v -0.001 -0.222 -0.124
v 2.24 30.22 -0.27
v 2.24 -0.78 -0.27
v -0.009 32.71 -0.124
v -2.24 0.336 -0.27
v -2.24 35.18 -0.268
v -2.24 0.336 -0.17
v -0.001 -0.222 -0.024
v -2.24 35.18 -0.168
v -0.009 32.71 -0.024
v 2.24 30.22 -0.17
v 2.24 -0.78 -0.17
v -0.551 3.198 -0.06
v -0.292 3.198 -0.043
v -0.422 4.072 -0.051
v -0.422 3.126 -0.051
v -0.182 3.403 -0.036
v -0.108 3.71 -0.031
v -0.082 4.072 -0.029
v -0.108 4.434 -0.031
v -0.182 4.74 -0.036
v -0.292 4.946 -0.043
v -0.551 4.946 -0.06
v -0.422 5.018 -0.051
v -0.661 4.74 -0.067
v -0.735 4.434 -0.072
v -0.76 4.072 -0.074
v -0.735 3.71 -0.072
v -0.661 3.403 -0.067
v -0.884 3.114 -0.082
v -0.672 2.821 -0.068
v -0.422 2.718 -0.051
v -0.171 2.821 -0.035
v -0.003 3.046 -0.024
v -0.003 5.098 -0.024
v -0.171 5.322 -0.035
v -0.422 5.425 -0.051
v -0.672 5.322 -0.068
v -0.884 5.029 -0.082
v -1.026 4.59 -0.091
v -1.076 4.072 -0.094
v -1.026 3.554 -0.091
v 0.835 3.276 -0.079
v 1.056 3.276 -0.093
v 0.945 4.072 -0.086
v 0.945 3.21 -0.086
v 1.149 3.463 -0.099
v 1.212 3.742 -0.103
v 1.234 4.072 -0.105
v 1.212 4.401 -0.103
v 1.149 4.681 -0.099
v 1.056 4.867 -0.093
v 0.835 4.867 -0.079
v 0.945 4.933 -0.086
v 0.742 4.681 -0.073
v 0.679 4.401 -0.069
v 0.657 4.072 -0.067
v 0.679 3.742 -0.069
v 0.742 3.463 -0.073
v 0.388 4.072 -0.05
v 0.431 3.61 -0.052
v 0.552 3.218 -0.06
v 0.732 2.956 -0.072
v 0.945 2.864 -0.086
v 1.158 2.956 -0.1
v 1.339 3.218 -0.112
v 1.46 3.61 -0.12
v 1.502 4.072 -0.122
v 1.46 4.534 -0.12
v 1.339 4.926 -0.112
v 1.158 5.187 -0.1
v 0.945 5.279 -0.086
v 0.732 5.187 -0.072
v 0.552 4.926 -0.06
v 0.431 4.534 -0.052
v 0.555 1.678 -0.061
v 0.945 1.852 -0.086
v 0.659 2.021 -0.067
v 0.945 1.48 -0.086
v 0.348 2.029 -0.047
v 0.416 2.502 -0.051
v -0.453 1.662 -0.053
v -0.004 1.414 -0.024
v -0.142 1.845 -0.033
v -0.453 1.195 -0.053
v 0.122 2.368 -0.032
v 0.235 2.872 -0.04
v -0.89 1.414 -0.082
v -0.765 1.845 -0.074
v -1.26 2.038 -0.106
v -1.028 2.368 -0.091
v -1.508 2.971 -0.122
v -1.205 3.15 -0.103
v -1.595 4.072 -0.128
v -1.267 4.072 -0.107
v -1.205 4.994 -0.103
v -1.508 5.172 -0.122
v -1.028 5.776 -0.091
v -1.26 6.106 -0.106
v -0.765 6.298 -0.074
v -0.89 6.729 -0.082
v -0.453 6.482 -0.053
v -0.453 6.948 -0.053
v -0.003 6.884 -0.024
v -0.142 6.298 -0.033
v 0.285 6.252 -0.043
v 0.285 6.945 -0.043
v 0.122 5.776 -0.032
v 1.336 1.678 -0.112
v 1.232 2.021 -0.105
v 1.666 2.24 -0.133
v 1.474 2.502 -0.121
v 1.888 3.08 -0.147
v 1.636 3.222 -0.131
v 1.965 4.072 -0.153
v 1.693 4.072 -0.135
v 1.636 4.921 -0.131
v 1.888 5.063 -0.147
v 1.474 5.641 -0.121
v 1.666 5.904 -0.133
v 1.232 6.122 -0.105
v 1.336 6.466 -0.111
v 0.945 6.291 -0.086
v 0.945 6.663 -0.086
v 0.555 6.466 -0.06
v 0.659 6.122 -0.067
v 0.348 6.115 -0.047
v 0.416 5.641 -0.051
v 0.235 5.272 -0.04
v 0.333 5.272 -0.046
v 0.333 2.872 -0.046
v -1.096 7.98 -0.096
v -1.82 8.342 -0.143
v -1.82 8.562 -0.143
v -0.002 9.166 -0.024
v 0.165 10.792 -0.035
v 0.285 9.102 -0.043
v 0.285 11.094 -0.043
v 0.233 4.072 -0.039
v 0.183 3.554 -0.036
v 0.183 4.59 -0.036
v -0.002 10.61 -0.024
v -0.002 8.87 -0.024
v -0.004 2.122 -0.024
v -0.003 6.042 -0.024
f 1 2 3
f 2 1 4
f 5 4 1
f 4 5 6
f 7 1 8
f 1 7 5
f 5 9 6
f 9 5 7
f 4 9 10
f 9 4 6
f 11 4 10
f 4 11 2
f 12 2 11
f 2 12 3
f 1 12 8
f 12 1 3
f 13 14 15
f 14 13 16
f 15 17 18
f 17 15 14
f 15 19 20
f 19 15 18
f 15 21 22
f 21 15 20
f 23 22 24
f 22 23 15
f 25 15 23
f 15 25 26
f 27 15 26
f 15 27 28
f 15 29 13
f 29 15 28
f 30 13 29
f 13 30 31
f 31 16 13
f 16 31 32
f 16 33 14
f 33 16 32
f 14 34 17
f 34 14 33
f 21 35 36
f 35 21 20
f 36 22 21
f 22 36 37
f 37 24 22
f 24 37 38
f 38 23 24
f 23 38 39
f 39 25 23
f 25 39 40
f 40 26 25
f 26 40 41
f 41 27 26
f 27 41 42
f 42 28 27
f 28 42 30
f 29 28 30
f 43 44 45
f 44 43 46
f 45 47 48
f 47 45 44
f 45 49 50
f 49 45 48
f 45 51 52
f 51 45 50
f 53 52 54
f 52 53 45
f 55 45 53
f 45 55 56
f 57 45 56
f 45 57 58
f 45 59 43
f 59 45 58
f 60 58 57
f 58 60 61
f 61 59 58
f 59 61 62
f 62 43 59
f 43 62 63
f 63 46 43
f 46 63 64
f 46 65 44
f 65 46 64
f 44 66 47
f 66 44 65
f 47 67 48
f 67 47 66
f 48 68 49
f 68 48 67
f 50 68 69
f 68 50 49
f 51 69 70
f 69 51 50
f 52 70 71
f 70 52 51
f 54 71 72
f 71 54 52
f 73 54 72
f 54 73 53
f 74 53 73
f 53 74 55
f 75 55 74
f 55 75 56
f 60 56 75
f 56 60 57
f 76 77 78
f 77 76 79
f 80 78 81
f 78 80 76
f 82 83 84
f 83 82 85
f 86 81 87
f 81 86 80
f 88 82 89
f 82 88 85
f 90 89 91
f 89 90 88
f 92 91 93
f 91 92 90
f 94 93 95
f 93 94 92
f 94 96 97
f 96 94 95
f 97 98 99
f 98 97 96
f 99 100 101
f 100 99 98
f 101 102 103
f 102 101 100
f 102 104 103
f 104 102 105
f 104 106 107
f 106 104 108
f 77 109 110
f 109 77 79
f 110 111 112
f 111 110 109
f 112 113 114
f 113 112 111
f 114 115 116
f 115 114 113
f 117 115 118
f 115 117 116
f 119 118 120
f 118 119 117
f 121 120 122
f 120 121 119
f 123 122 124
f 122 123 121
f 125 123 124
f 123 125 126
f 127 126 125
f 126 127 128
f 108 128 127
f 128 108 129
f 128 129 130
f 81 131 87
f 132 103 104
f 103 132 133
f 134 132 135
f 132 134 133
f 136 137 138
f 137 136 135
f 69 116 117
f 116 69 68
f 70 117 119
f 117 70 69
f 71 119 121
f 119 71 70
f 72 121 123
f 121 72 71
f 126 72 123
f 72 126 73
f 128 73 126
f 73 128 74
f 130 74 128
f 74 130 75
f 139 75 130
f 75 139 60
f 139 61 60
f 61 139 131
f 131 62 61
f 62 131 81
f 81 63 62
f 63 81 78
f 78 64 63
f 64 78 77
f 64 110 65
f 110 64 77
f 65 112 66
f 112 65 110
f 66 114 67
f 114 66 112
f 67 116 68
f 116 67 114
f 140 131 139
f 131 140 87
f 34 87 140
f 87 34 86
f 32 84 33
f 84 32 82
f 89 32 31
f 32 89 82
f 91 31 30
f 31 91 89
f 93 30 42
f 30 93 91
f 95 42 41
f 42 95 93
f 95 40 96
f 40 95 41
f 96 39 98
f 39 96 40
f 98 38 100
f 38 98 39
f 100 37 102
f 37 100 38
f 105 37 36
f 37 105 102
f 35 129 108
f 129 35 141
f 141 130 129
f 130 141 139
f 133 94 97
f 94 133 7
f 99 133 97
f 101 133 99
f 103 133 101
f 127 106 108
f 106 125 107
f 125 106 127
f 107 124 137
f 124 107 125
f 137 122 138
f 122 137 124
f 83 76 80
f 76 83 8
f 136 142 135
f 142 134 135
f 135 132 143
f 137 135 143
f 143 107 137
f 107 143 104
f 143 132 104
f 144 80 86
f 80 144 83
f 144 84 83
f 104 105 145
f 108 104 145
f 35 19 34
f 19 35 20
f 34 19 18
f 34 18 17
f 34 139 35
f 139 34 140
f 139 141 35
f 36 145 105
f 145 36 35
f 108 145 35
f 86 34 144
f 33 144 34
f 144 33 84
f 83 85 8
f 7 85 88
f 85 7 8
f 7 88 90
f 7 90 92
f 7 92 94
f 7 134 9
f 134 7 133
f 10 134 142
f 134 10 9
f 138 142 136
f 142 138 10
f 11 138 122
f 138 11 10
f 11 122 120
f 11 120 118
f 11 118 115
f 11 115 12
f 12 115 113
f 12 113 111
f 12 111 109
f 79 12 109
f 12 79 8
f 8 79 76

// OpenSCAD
use <../lib.scad>
function ldraw_lib__4125165gc01() = [
// 0 Sticker  0.6 x  4.5 Trapezoid with White "v8" on Right Side on Red Background (Formed)
// 0 Name: 4125165gc01.dat
// 0 Author: Philippe Hurbain [Philo]
// 0 !LDRAW_ORG Part UPDATE 2019-03
// 0 !LICENSE Licensed under CC BY 4.0 : see CAreadme.txt
// 
// 0 BFC CERTIFY CCW
  [0,"BFC","CERTIFY"],
  [0,"BFC","CCW"],
// 
// 0 !KEYWORDS Set 8448
// 
// 0 !HISTORY 2019-12-27 [PTadmin] Official Update 2019-03
// 
// 
// 4 16 -0.0228 0.3101 81.7753 5.6 0.6755 75.55 5.6 0.6762 -1.95 -0.0023 0.31 -0.5544
  [4,16,-0.0228,0.3101,81.7753,5.6,0.6755,75.55,5.6,0.6762,-1.95,-0.0023,0.31,-0.5544],
// 4 16 -0.0228 0.3101 81.7753 -0.0023 0.31 -0.5544 -5.6 0.6762 0.84 -5.6 0.6712 87.95
  [4,16,-0.0228,0.3101,81.7753,-0.0023,0.31,-0.5544,-5.6,0.6762,0.84,-5.6,0.6712,87.95],
// 
// 4 16 -5.6 0.4262 0.84 -5.6 0.6762 0.84 -0.0023 0.31 -0.5544 -0.0024 0.06 -0.5544
  [4,16,-5.6,0.4262,0.84,-5.6,0.6762,0.84,-0.0023,0.31,-0.5544,-0.0024,0.06,-0.5544],
// 4 16 -5.6 0.4212 87.95 -5.6 0.6712 87.95 -5.6 0.6762 0.84 -5.6 0.4262 0.84
  [4,16,-5.6,0.4212,87.95,-5.6,0.6712,87.95,-5.6,0.6762,0.84,-5.6,0.4262,0.84],
// 4 16 -0.0228 0.0601 81.7753 -0.0228 0.3101 81.7753 -5.6 0.6712 87.95 -5.6 0.4212 87.95
  [4,16,-0.0228,0.0601,81.7753,-0.0228,0.3101,81.7753,-5.6,0.6712,87.95,-5.6,0.4212,87.95],
// 4 16 5.6 0.4255 75.55 5.6 0.6755 75.55 -0.0228 0.3101 81.7753 -0.0228 0.0601 81.7753
  [4,16,5.6,0.4255,75.55,5.6,0.6755,75.55,-0.0228,0.3101,81.7753,-0.0228,0.0601,81.7753],
// 4 16 5.6 0.4262 -1.95 5.6 0.6762 -1.95 5.6 0.6755 75.55 5.6 0.4255 75.55
  [4,16,5.6,0.4262,-1.95,5.6,0.6762,-1.95,5.6,0.6755,75.55,5.6,0.4255,75.55],
// 4 16 -0.0024 0.06 -0.5544 -0.0023 0.31 -0.5544 5.6 0.6762 -1.95 5.6 0.4262 -1.95
  [4,16,-0.0024,0.06,-0.5544,-0.0023,0.31,-0.5544,5.6,0.6762,-1.95,5.6,0.4262,-1.95],
// 
// 4 4 -1.054 0.1285 10.1792 -1.378 0.1496 7.9952 -1.054 0.1284 7.8152 -0.729 0.1072 7.9952
  [4,4,-1.054,0.1285,10.1792,-1.378,0.1496,7.9952,-1.054,0.1284,7.8152,-0.729,0.1072,7.9952],
// 4 4 -1.054 0.1285 10.1792 -0.729 0.1072 7.9952 -0.454 0.0892 8.5072 -0.271 0.0772 9.2742
  [4,4,-1.054,0.1285,10.1792,-0.729,0.1072,7.9952,-0.454,0.0892,8.5072,-0.271,0.0772,9.2742],
// 4 4 -1.054 0.1285 10.1792 -0.271 0.0772 9.2742 -0.206 0.073 10.1792 -0.271 0.0773 11.0842
  [4,4,-1.054,0.1285,10.1792,-0.271,0.0772,9.2742,-0.206,0.073,10.1792,-0.271,0.0773,11.0842],
// 4 4 -1.054 0.1285 10.1792 -0.271 0.0773 11.0842 -0.454 0.0892 11.8512 -0.729 0.1072 12.3642
  [4,4,-1.054,0.1285,10.1792,-0.271,0.0773,11.0842,-0.454,0.0892,11.8512,-0.729,0.1072,12.3642],
// 4 4 -1.054 0.1285 10.1792 -0.729 0.1072 12.3642 -1.054 0.1285 12.5442 -1.378 0.1497 12.3642
  [4,4,-1.054,0.1285,10.1792,-0.729,0.1072,12.3642,-1.054,0.1285,12.5442,-1.378,0.1497,12.3642],
// 4 4 -1.054 0.1285 10.1792 -1.378 0.1497 12.3642 -1.653 0.1677 11.8512 -1.837 0.1797 11.0842
  [4,4,-1.054,0.1285,10.1792,-1.378,0.1497,12.3642,-1.653,0.1677,11.8512,-1.837,0.1797,11.0842],
// 4 4 -1.054 0.1285 10.1792 -1.837 0.1797 11.0842 -1.901 0.1839 10.1792 -1.837 0.1797 9.2742
  [4,4,-1.054,0.1285,10.1792,-1.837,0.1797,11.0842,-1.901,0.1839,10.1792,-1.837,0.1797,9.2742],
// 4 4 -1.054 0.1285 10.1792 -1.837 0.1797 9.2742 -1.653 0.1676 8.5072 -1.378 0.1496 7.9952
  [4,4,-1.054,0.1285,10.1792,-1.837,0.1797,9.2742,-1.653,0.1676,8.5072,-1.378,0.1496,7.9952],
// 4 15 -1.653 0.1676 8.5072 -2.21 0.2041 7.7862 -1.68 0.1694 7.0532 -1.378 0.1496 7.9952
  [4,15,-1.653,0.1676,8.5072,-2.21,0.2041,7.7862,-1.68,0.1694,7.0532,-1.378,0.1496,7.9952],
// 4 15 -1.378 0.1496 7.9952 -1.68 0.1694 7.0532 -1.054 0.1284 6.7952 -1.054 0.1284 7.8152
  [4,15,-1.378,0.1496,7.9952,-1.68,0.1694,7.0532,-1.054,0.1284,6.7952,-1.054,0.1284,7.8152],
// 4 15 -1.054 0.1284 7.8152 -1.054 0.1284 6.7952 -0.428 0.0875 7.0532 -0.729 0.1072 7.9952
  [4,15,-1.054,0.1284,7.8152,-1.054,0.1284,6.7952,-0.428,0.0875,7.0532,-0.729,0.1072,7.9952],
// 4 15 -0.729 0.1072 7.9952 -0.428 0.0875 7.0532 -0.0086 0.06 7.6152 -0.454 0.0892 8.5072
  [4,15,-0.729,0.1072,7.9952,-0.428,0.0875,7.0532,-0.0086,0.06,7.6152,-0.454,0.0892,8.5072],
// 4 15 -0.454 0.0892 11.8512 -0.271 0.0773 11.0842 -0.0074 0.06 12.7452 -0.428 0.0876 13.3062
  [4,15,-0.454,0.0892,11.8512,-0.271,0.0773,11.0842,-0.0074,0.06,12.7452,-0.428,0.0876,13.3062],
// 4 15 -0.729 0.1072 12.3642 -0.454 0.0892 11.8512 -0.428 0.0876 13.3062 -1.054 0.1285 13.5632
  [4,15,-0.729,0.1072,12.3642,-0.454,0.0892,11.8512,-0.428,0.0876,13.3062,-1.054,0.1285,13.5632],
// 4 15 -1.054 0.1285 12.5442 -0.729 0.1072 12.3642 -1.054 0.1285 13.5632 -1.68 0.1695 13.3062
  [4,15,-1.054,0.1285,12.5442,-0.729,0.1072,12.3642,-1.054,0.1285,13.5632,-1.68,0.1695,13.3062],
// 4 15 -1.378 0.1497 12.3642 -1.054 0.1285 12.5442 -1.68 0.1695 13.3062 -2.21 0.2041 12.5722
  [4,15,-1.378,0.1497,12.3642,-1.054,0.1285,12.5442,-1.68,0.1695,13.3062,-2.21,0.2041,12.5722],
// 4 15 -1.653 0.1677 11.8512 -1.378 0.1497 12.3642 -2.21 0.2041 12.5722 -2.565 0.2273 11.4742
  [4,15,-1.653,0.1677,11.8512,-1.378,0.1497,12.3642,-2.21,0.2041,12.5722,-2.565,0.2273,11.4742],
// 4 15 -1.837 0.1797 11.0842 -1.653 0.1677 11.8512 -2.565 0.2273 11.4742 -2.689 0.2354 10.1792
  [4,15,-1.837,0.1797,11.0842,-1.653,0.1677,11.8512,-2.565,0.2273,11.4742,-2.689,0.2354,10.1792],
// 4 15 -1.901 0.1839 10.1792 -1.837 0.1797 11.0842 -2.689 0.2354 10.1792 -2.565 0.2273 8.8842
  [4,15,-1.901,0.1839,10.1792,-1.837,0.1797,11.0842,-2.689,0.2354,10.1792,-2.565,0.2273,8.8842],
// 4 15 -1.837 0.1797 9.2742 -1.901 0.1839 10.1792 -2.565 0.2273 8.8842 -2.21 0.2041 7.7862
  [4,15,-1.837,0.1797,9.2742,-1.901,0.1839,10.1792,-2.565,0.2273,8.8842,-2.21,0.2041,7.7862],
// 3 15 -1.653 0.1676 8.5072 -1.837 0.1797 9.2742 -2.21 0.2041 7.7862
  [3,15,-1.653,0.1676,8.5072,-1.837,0.1797,9.2742,-2.21,0.2041,7.7862],
// 4 4 2.363 0.215 10.1792 2.087 0.197 8.1902 2.363 0.2151 8.0262 2.639 0.2331 8.1902
  [4,4,2.363,0.215,10.1792,2.087,0.197,8.1902,2.363,0.2151,8.0262,2.639,0.2331,8.1902],
// 4 4 2.363 0.215 10.1792 2.639 0.2331 8.1902 2.873 0.2484 8.6572 3.029 0.2586 9.3552
  [4,4,2.363,0.215,10.1792,2.639,0.2331,8.1902,2.873,0.2484,8.6572,3.029,0.2586,9.3552],
// 4 4 2.363 0.215 10.1792 3.029 0.2586 9.3552 3.084 0.2621 10.1792 3.029 0.2585 11.0032
  [4,4,2.363,0.215,10.1792,3.029,0.2586,9.3552,3.084,0.2621,10.1792,3.029,0.2585,11.0032],
// 4 4 2.363 0.215 10.1792 3.029 0.2585 11.0032 2.873 0.2483 11.7022 2.639 0.233 12.1682
  [4,4,2.363,0.215,10.1792,3.029,0.2585,11.0032,2.873,0.2483,11.7022,2.639,0.233,12.1682],
// 4 4 2.363 0.215 10.1792 2.639 0.233 12.1682 2.363 0.215 12.3322 2.087 0.1969 12.1682
  [4,4,2.363,0.215,10.1792,2.639,0.233,12.1682,2.363,0.215,12.3322,2.087,0.1969,12.1682],
// 4 4 2.363 0.215 10.1792 2.087 0.1969 12.1682 1.854 0.1817 11.7022 1.697 0.1715 11.0032
  [4,4,2.363,0.215,10.1792,2.087,0.1969,12.1682,1.854,0.1817,11.7022,1.697,0.1715,11.0032],
// 4 4 2.363 0.215 10.1792 1.697 0.1715 11.0032 1.643 0.168 10.1792 1.697 0.1715 9.3552
  [4,4,2.363,0.215,10.1792,1.697,0.1715,11.0032,1.643,0.168,10.1792,1.697,0.1715,9.3552],
// 4 4 2.363 0.215 10.1792 1.697 0.1715 9.3552 1.854 0.1818 8.6572 2.087 0.197 8.1902
  [4,4,2.363,0.215,10.1792,1.697,0.1715,9.3552,1.854,0.1818,8.6572,2.087,0.197,8.1902],
// 4 15 1.697 0.1715 9.3552 1.643 0.168 10.1792 0.971 0.124 10.1792 1.077 0.131 9.0242
  [4,15,1.697,0.1715,9.3552,1.643,0.168,10.1792,0.971,0.124,10.1792,1.077,0.131,9.0242],
// 4 15 1.854 0.1818 8.6572 1.697 0.1715 9.3552 1.077 0.131 9.0242 1.379 0.1507 8.0452
  [4,15,1.854,0.1818,8.6572,1.697,0.1715,9.3552,1.077,0.131,9.0242,1.379,0.1507,8.0452],
// 4 15 2.087 0.197 8.1902 1.854 0.1818 8.6572 1.379 0.1507 8.0452 1.83 0.1802 7.3912
  [4,15,2.087,0.197,8.1902,1.854,0.1818,8.6572,1.379,0.1507,8.0452,1.83,0.1802,7.3912],
// 4 15 2.363 0.2151 8.0262 2.087 0.197 8.1902 1.83 0.1802 7.3912 2.363 0.2151 7.1612
  [4,15,2.363,0.2151,8.0262,2.087,0.197,8.1902,1.83,0.1802,7.3912,2.363,0.2151,7.1612],
// 4 15 2.639 0.2331 8.1902 2.363 0.2151 8.0262 2.363 0.2151 7.1612 2.896 0.2499 7.3912
  [4,15,2.639,0.2331,8.1902,2.363,0.2151,8.0262,2.363,0.2151,7.1612,2.896,0.2499,7.3912],
// 4 15 2.873 0.2484 8.6572 2.639 0.2331 8.1902 2.896 0.2499 7.3912 3.348 0.2794 8.0452
  [4,15,2.873,0.2484,8.6572,2.639,0.2331,8.1902,2.896,0.2499,7.3912,3.348,0.2794,8.0452],
// 4 15 3.029 0.2586 9.3552 2.873 0.2484 8.6572 3.348 0.2794 8.0452 3.65 0.2992 9.0242
  [4,15,3.029,0.2586,9.3552,2.873,0.2484,8.6572,3.348,0.2794,8.0452,3.65,0.2992,9.0242],
// 4 15 3.084 0.2621 10.1792 3.029 0.2586 9.3552 3.65 0.2992 9.0242 3.756 0.3061 10.1792
  [4,15,3.084,0.2621,10.1792,3.029,0.2586,9.3552,3.65,0.2992,9.0242,3.756,0.3061,10.1792],
// 4 15 3.029 0.2585 11.0032 3.084 0.2621 10.1792 3.756 0.3061 10.1792 3.65 0.2991 11.3342
  [4,15,3.029,0.2585,11.0032,3.084,0.2621,10.1792,3.756,0.3061,10.1792,3.65,0.2991,11.3342],
// 4 15 2.873 0.2483 11.7022 3.029 0.2585 11.0032 3.65 0.2991 11.3342 3.348 0.2794 12.3142
  [4,15,2.873,0.2483,11.7022,3.029,0.2585,11.0032,3.65,0.2991,11.3342,3.348,0.2794,12.3142],
// 4 15 2.639 0.233 12.1682 2.873 0.2483 11.7022 3.348 0.2794 12.3142 2.896 0.2498 12.9682
  [4,15,2.639,0.233,12.1682,2.873,0.2483,11.7022,3.348,0.2794,12.3142,2.896,0.2498,12.9682],
// 4 15 2.363 0.215 12.3322 2.639 0.233 12.1682 2.896 0.2498 12.9682 2.363 0.215 13.1982
  [4,15,2.363,0.215,12.3322,2.639,0.233,12.1682,2.896,0.2498,12.9682,2.363,0.215,13.1982],
// 4 15 2.087 0.1969 12.1682 2.363 0.215 12.3322 2.363 0.215 13.1982 1.83 0.1801 12.9682
  [4,15,2.087,0.1969,12.1682,2.363,0.215,12.3322,2.363,0.215,13.1982,1.83,0.1801,12.9682],
// 4 15 1.854 0.1817 11.7022 2.087 0.1969 12.1682 1.83 0.1801 12.9682 1.379 0.1507 12.3142
  [4,15,1.854,0.1817,11.7022,2.087,0.1969,12.1682,1.83,0.1801,12.9682,1.379,0.1507,12.3142],
// 4 15 1.697 0.1715 11.0032 1.854 0.1817 11.7022 1.379 0.1507 12.3142 1.077 0.1309 11.3342
  [4,15,1.697,0.1715,11.0032,1.854,0.1817,11.7022,1.379,0.1507,12.3142,1.077,0.1309,11.3342],
// 4 15 1.643 0.168 10.1792 1.697 0.1715 11.0032 1.077 0.1309 11.3342 0.971 0.124 10.1792
  [4,15,1.643,0.168,10.1792,1.697,0.1715,11.0032,1.077,0.1309,11.3342,0.971,0.124,10.1792],
// 4 15 1.387 0.1513 4.1952 2.363 0.2151 3.7012 2.363 0.2151 4.6312 1.648 0.1684 5.0532
  [4,15,1.387,0.1513,4.1952,2.363,0.2151,3.7012,2.363,0.2151,4.6312,1.648,0.1684,5.0532],
// 4 15 0.871 0.1176 5.0722 1.387 0.1513 4.1952 1.648 0.1684 5.0532 1.041 0.1287 6.2562
  [4,15,0.871,0.1176,5.0722,1.387,0.1513,4.1952,1.648,0.1684,5.0532,1.041,0.1287,6.2562],
// 4 15 -1.133 0.1335 4.1542 -1.133 0.1335 2.9882 -0.0097 0.06 3.5352 -0.355 0.0827 4.6132
  [4,15,-1.133,0.1335,4.1542,-1.133,0.1335,2.9882,-0.0097,0.06,3.5352,-0.355,0.0827,4.6132],
// 4 15 0.304 0.0805 5.9192 0.871 0.1176 5.0722 1.041 0.1287 6.2562 0.588 0.099 7.1802
  [4,15,0.304,0.0805,5.9192,0.871,0.1176,5.0722,1.041,0.1287,6.2562,0.588,0.099,7.1802],
// 4 15 -2.225 0.205 3.5352 -1.133 0.1335 2.9882 -1.133 0.1335 4.1542 -1.912 0.1845 4.6132
  [4,15,-2.225,0.205,3.5352,-1.133,0.1335,2.9882,-1.133,0.1335,4.1542,-1.912,0.1845,4.6132],
// 4 15 -3.151 0.2656 5.0942 -2.225 0.205 3.5352 -1.912 0.1845 4.6132 -2.571 0.2276 5.9192
  [4,15,-3.151,0.2656,5.0942,-2.225,0.205,3.5352,-1.912,0.1845,4.6132,-2.571,0.2276,5.9192],
// 4 15 -3.77 0.3061 7.4272 -3.151 0.2656 5.0942 -2.571 0.2276 5.9192 -3.012 0.2565 7.8742
  [4,15,-3.77,0.3061,7.4272,-3.151,0.2656,5.0942,-2.571,0.2276,5.9192,-3.012,0.2565,7.8742],
// 4 15 -3.987 0.3203 10.1792 -3.77 0.3061 7.4272 -3.012 0.2565 7.8742 -3.167 0.2667 10.1792
  [4,15,-3.987,0.3203,10.1792,-3.77,0.3061,7.4272,-3.012,0.2565,7.8742,-3.167,0.2667,10.1792],
// 4 15 -3.77 0.3062 12.9312 -3.987 0.3203 10.1792 -3.167 0.2667 10.1792 -3.012 0.2566 12.4852
  [4,15,-3.77,0.3062,12.9312,-3.987,0.3203,10.1792,-3.167,0.2667,10.1792,-3.012,0.2566,12.4852],
// 4 15 -3.151 0.2657 15.2642 -3.77 0.3062 12.9312 -3.012 0.2566 12.4852 -2.571 0.2278 14.4402
  [4,15,-3.151,0.2657,15.2642,-3.77,0.3062,12.9312,-3.012,0.2566,12.4852,-2.571,0.2278,14.4402],
// 4 15 -2.225 0.2052 16.8232 -3.151 0.2657 15.2642 -2.571 0.2278 14.4402 -1.912 0.1847 15.7462
  [4,15,-2.225,0.2052,16.8232,-3.151,0.2657,15.2642,-2.571,0.2278,14.4402,-1.912,0.1847,15.7462],
// 4 15 -1.133 0.1337 17.3712 -2.225 0.2052 16.8232 -1.912 0.1847 15.7462 -1.133 0.1337 16.2042
  [4,15,-1.133,0.1337,17.3712,-2.225,0.2052,16.8232,-1.912,0.1847,15.7462,-1.133,0.1337,16.2042],
// 4 15 -0.0063 0.06 17.2112 -1.133 0.1337 17.3712 -1.133 0.1337 16.2042 -0.355 0.0828 15.7462
  [4,15,-0.0063,0.06,17.2112,-1.133,0.1337,17.3712,-1.133,0.1337,16.2042,-0.355,0.0828,15.7462],
// 4 15 -0.0063 0.06 17.2112 0.304 0.0804 14.4402 0.712 0.107 15.6292 0.712 0.107 17.3632
  [4,15,-0.0063,0.06,17.2112,0.304,0.0804,14.4402,0.712,0.107,15.6292,0.712,0.107,17.3632],
// 4 15 2.363 0.2151 4.6312 2.363 0.2151 3.7012 3.339 0.2789 4.1952 3.079 0.2619 5.0532
  [4,15,2.363,0.2151,4.6312,2.363,0.2151,3.7012,3.339,0.2789,4.1952,3.079,0.2619,5.0532],
// 4 15 3.079 0.2619 5.0532 3.339 0.2789 4.1952 4.166 0.3328 5.5992 3.685 0.3015 6.2562
  [4,15,3.079,0.2619,5.0532,3.339,0.2789,4.1952,4.166,0.3328,5.5992,3.685,0.3015,6.2562],
// 4 15 3.685 0.3015 6.2562 4.166 0.3328 5.5992 4.719 0.3687 7.7002 4.091 0.3279 8.0562
  [4,15,3.685,0.3015,6.2562,4.166,0.3328,5.5992,4.719,0.3687,7.7002,4.091,0.3279,8.0562],
// 4 15 4.091 0.3279 8.0562 4.719 0.3687 7.7002 4.913 0.3813 10.1792 4.233 0.3371 10.1792
  [4,15,4.091,0.3279,8.0562,4.719,0.3687,7.7002,4.913,0.3813,10.1792,4.233,0.3371,10.1792],
// 4 15 4.233 0.3371 10.1792 4.913 0.3813 10.1792 4.719 0.3687 12.6582 4.091 0.3279 12.3032
  [4,15,4.233,0.3371,10.1792,4.913,0.3813,10.1792,4.719,0.3687,12.6582,4.091,0.3279,12.3032],
// 4 15 4.091 0.3279 12.3032 4.719 0.3687 12.6582 4.166 0.3328 14.7602 3.685 0.3014 14.1032
  [4,15,4.091,0.3279,12.3032,4.719,0.3687,12.6582,4.166,0.3328,14.7602,3.685,0.3014,14.1032],
// 4 15 3.685 0.3014 14.1032 4.166 0.3328 14.7602 3.339 0.2787 16.1642 3.079 0.2617 15.3052
  [4,15,3.685,0.3014,14.1032,4.166,0.3328,14.7602,3.339,0.2787,16.1642,3.079,0.2617,15.3052],
// 4 15 3.079 0.2617 15.3052 3.339 0.2787 16.1642 2.363 0.2149 16.6572 2.363 0.2149 15.7282
  [4,15,3.079,0.2617,15.3052,3.339,0.2787,16.1642,2.363,0.2149,16.6572,2.363,0.2149,15.7282],
// 4 15 2.363 0.2149 15.7282 2.363 0.2149 16.6572 1.387 0.1511 16.1642 1.648 0.1682 15.3052
  [4,15,2.363,0.2149,15.7282,2.363,0.2149,16.6572,1.387,0.1511,16.1642,1.648,0.1682,15.3052],
// 4 15 1.648 0.1682 15.3052 1.387 0.1511 16.1642 0.871 0.1174 15.2872 1.041 0.1285 14.1032
  [4,15,1.648,0.1682,15.3052,1.387,0.1511,16.1642,0.871,0.1174,15.2872,1.041,0.1285,14.1032],
// 4 15 1.041 0.1285 14.1032 0.871 0.1174 15.2872 0.304 0.0804 14.4402 0.588 0.0989 13.1792
  [4,15,1.041,0.1285,14.1032,0.871,0.1174,15.2872,0.304,0.0804,14.4402,0.588,0.0989,13.1792],
// 3 15 1.041 0.1285 14.1032 0.588 0.0989 13.1792 0.833 0.115 13.1792
  [3,15,1.041,0.1285,14.1032,0.588,0.0989,13.1792,0.833,0.115,13.1792],
// 3 15 1.041 0.1287 6.2562 0.833 0.1151 7.1802 0.588 0.099 7.1802
  [3,15,1.041,0.1287,6.2562,0.833,0.1151,7.1802,0.588,0.099,7.1802],
// 4 15 -1.133 0.1337 17.3712 -0.0063 0.06 17.2112 -2.739 0.2388 19.9502 -4.55 0.3573 20.8562
  [4,15,-1.133,0.1337,17.3712,-0.0063,0.06,17.2112,-2.739,0.2388,19.9502,-4.55,0.3573,20.8562],
// 4 15 -4.55 0.3573 21.4062 -4.55 0.3573 20.8562 -2.739 0.2388 19.9502 -0.0048 0.06 22.9142
  [4,15,-4.55,0.3573,21.4062,-4.55,0.3573,20.8562,-2.739,0.2388,19.9502,-0.0048,0.06,22.9142],
// 4 15 0.712 0.1068 27.7352 0.413 0.0873 26.9812 -0.0048 0.06 22.9142 0.712 0.1069 22.7542
  [4,15,0.712,0.1068,27.7352,0.413,0.0873,26.9812,-0.0048,0.06,22.9142,0.712,0.1069,22.7542],
// 4 4 3.65 0.2991 11.3342 3.756 0.3061 10.1792 4.233 0.3371 10.1792 4.091 0.3279 12.3032
  [4,4,3.65,0.2991,11.3342,3.756,0.3061,10.1792,4.233,0.3371,10.1792,4.091,0.3279,12.3032],
// 4 4 3.348 0.2794 12.3142 3.65 0.2991 11.3342 4.091 0.3279 12.3032 3.685 0.3014 14.1032
  [4,4,3.348,0.2794,12.3142,3.65,0.2991,11.3342,4.091,0.3279,12.3032,3.685,0.3014,14.1032],
// 4 4 2.896 0.2498 12.9682 3.348 0.2794 12.3142 3.685 0.3014 14.1032 3.079 0.2617 15.3052
  [4,4,2.896,0.2498,12.9682,3.348,0.2794,12.3142,3.685,0.3014,14.1032,3.079,0.2617,15.3052],
// 4 4 2.363 0.215 13.1982 2.896 0.2498 12.9682 3.079 0.2617 15.3052 2.363 0.2149 15.7282
  [4,4,2.363,0.215,13.1982,2.896,0.2498,12.9682,3.079,0.2617,15.3052,2.363,0.2149,15.7282],
// 4 4 1.83 0.1801 12.9682 2.363 0.215 13.1982 2.363 0.2149 15.7282 1.648 0.1682 15.3052
  [4,4,1.83,0.1801,12.9682,2.363,0.215,13.1982,2.363,0.2149,15.7282,1.648,0.1682,15.3052],
// 4 4 1.379 0.1507 12.3142 1.83 0.1801 12.9682 1.648 0.1682 15.3052 1.041 0.1285 14.1032
  [4,4,1.379,0.1507,12.3142,1.83,0.1801,12.9682,1.648,0.1682,15.3052,1.041,0.1285,14.1032],
// 4 4 1.077 0.1309 11.3342 1.379 0.1507 12.3142 1.041 0.1285 14.1032 0.833 0.115 13.1792
  [4,4,1.077,0.1309,11.3342,1.379,0.1507,12.3142,1.041,0.1285,14.1032,0.833,0.115,13.1792],
// 4 4 0.971 0.124 10.1792 1.077 0.1309 11.3342 0.833 0.115 13.1792 0.582 0.0986 10.1792
  [4,4,0.971,0.124,10.1792,1.077,0.1309,11.3342,0.833,0.115,13.1792,0.582,0.0986,10.1792],
// 4 4 0.971 0.124 10.1792 0.582 0.0986 10.1792 0.833 0.1151 7.1802 1.077 0.131 9.0242
  [4,4,0.971,0.124,10.1792,0.582,0.0986,10.1792,0.833,0.1151,7.1802,1.077,0.131,9.0242],
// 4 4 1.077 0.131 9.0242 0.833 0.1151 7.1802 1.041 0.1287 6.2562 1.379 0.1507 8.0452
  [4,4,1.077,0.131,9.0242,0.833,0.1151,7.1802,1.041,0.1287,6.2562,1.379,0.1507,8.0452],
// 4 4 1.379 0.1507 8.0452 1.041 0.1287 6.2562 1.648 0.1684 5.0532 1.83 0.1802 7.3912
  [4,4,1.379,0.1507,8.0452,1.041,0.1287,6.2562,1.648,0.1684,5.0532,1.83,0.1802,7.3912],
// 4 4 1.83 0.1802 7.3912 1.648 0.1684 5.0532 2.363 0.2151 4.6312 2.363 0.2151 7.1612
  [4,4,1.83,0.1802,7.3912,1.648,0.1684,5.0532,2.363,0.2151,4.6312,2.363,0.2151,7.1612],
// 4 4 2.363 0.2151 7.1612 2.363 0.2151 4.6312 3.079 0.2619 5.0532 2.896 0.2499 7.3912
  [4,4,2.363,0.2151,7.1612,2.363,0.2151,4.6312,3.079,0.2619,5.0532,2.896,0.2499,7.3912],
// 4 4 2.896 0.2499 7.3912 3.079 0.2619 5.0532 3.685 0.3015 6.2562 3.348 0.2794 8.0452
  [4,4,2.896,0.2499,7.3912,3.079,0.2619,5.0532,3.685,0.3015,6.2562,3.348,0.2794,8.0452],
// 4 4 3.348 0.2794 8.0452 3.685 0.3015 6.2562 4.091 0.3279 8.0562 3.65 0.2992 9.0242
  [4,4,3.348,0.2794,8.0452,3.685,0.3015,6.2562,4.091,0.3279,8.0562,3.65,0.2992,9.0242],
// 4 4 3.65 0.2992 9.0242 4.091 0.3279 8.0562 4.233 0.3371 10.1792 3.756 0.3061 10.1792
  [4,4,3.65,0.2992,9.0242,4.091,0.3279,8.0562,4.233,0.3371,10.1792,3.756,0.3061,10.1792],
// 4 4 0.833 0.1151 7.1802 0.582 0.0986 10.1792 0.458 0.0905 8.8842 0.588 0.099 7.1802
  [4,4,0.833,0.1151,7.1802,0.582,0.0986,10.1792,0.458,0.0905,8.8842,0.588,0.099,7.1802],
// 4 4 0.588 0.099 7.1802 0.458 0.0905 8.8842 -0.0086 0.06 7.6152 0.304 0.0805 5.9192
  [4,4,0.588,0.099,7.1802,0.458,0.0905,8.8842,-0.0086,0.06,7.6152,0.304,0.0805,5.9192],
// 4 4 -0.355 0.0827 4.6132 -0.428 0.0875 7.0532 -1.054 0.1284 6.7952 -1.133 0.1335 4.1542
  [4,4,-0.355,0.0827,4.6132,-0.428,0.0875,7.0532,-1.054,0.1284,6.7952,-1.133,0.1335,4.1542],
// 4 4 -1.133 0.1335 4.1542 -1.054 0.1284 6.7952 -1.68 0.1694 7.0532 -1.912 0.1845 4.6132
  [4,4,-1.133,0.1335,4.1542,-1.054,0.1284,6.7952,-1.68,0.1694,7.0532,-1.912,0.1845,4.6132],
// 4 4 -1.912 0.1845 4.6132 -1.68 0.1694 7.0532 -2.21 0.2041 7.7862 -2.571 0.2276 5.9192
  [4,4,-1.912,0.1845,4.6132,-1.68,0.1694,7.0532,-2.21,0.2041,7.7862,-2.571,0.2276,5.9192],
// 4 4 -2.571 0.2276 5.9192 -2.21 0.2041 7.7862 -2.565 0.2273 8.8842 -3.012 0.2565 7.8742
  [4,4,-2.571,0.2276,5.9192,-2.21,0.2041,7.7862,-2.565,0.2273,8.8842,-3.012,0.2565,7.8742],
// 4 4 -3.012 0.2565 7.8742 -2.565 0.2273 8.8842 -2.689 0.2354 10.1792 -3.167 0.2667 10.1792
  [4,4,-3.012,0.2565,7.8742,-2.565,0.2273,8.8842,-2.689,0.2354,10.1792,-3.167,0.2667,10.1792],
// 4 4 -3.012 0.2566 12.4852 -3.167 0.2667 10.1792 -2.689 0.2354 10.1792 -2.565 0.2273 11.4742
  [4,4,-3.012,0.2566,12.4852,-3.167,0.2667,10.1792,-2.689,0.2354,10.1792,-2.565,0.2273,11.4742],
// 4 4 -2.571 0.2278 14.4402 -3.012 0.2566 12.4852 -2.565 0.2273 11.4742 -2.21 0.2041 12.5722
  [4,4,-2.571,0.2278,14.4402,-3.012,0.2566,12.4852,-2.565,0.2273,11.4742,-2.21,0.2041,12.5722],
// 4 4 -1.912 0.1847 15.7462 -2.571 0.2278 14.4402 -2.21 0.2041 12.5722 -1.68 0.1695 13.3062
  [4,4,-1.912,0.1847,15.7462,-2.571,0.2278,14.4402,-2.21,0.2041,12.5722,-1.68,0.1695,13.3062],
// 4 4 -1.133 0.1337 16.2042 -1.912 0.1847 15.7462 -1.68 0.1695 13.3062 -1.054 0.1285 13.5632
  [4,4,-1.133,0.1337,16.2042,-1.912,0.1847,15.7462,-1.68,0.1695,13.3062,-1.054,0.1285,13.5632],
// 4 4 -0.355 0.0828 15.7462 -1.133 0.1337 16.2042 -1.054 0.1285 13.5632 -0.428 0.0876 13.3062
  [4,4,-0.355,0.0828,15.7462,-1.133,0.1337,16.2042,-1.054,0.1285,13.5632,-0.428,0.0876,13.3062],
// 4 4 0.588 0.0989 13.1792 0.304 0.0804 14.4402 -0.0074 0.06 12.7452 0.458 0.0905 11.4742
  [4,4,0.588,0.0989,13.1792,0.304,0.0804,14.4402,-0.0074,0.06,12.7452,0.458,0.0905,11.4742],
// 4 4 0.833 0.115 13.1792 0.588 0.0989 13.1792 0.458 0.0905 11.4742 0.582 0.0986 10.1792
  [4,4,0.833,0.115,13.1792,0.588,0.0989,13.1792,0.458,0.0905,11.4742,0.582,0.0986,10.1792],
// 4 4 -3.987 0.3203 10.1792 -3.77 0.3062 12.9312 -4.55 0.3573 20.8562 -5.6 0.4262 0.84
  [4,4,-3.987,0.3203,10.1792,-3.77,0.3062,12.9312,-4.55,0.3573,20.8562,-5.6,0.4262,0.84],
// 3 4 -3.151 0.2657 15.2642 -4.55 0.3573 20.8562 -3.77 0.3062 12.9312
  [3,4,-3.151,0.2657,15.2642,-4.55,0.3573,20.8562,-3.77,0.3062,12.9312],
// 3 4 -2.225 0.2052 16.8232 -4.55 0.3573 20.8562 -3.151 0.2657 15.2642
  [3,4,-2.225,0.2052,16.8232,-4.55,0.3573,20.8562,-3.151,0.2657,15.2642],
// 3 4 -1.133 0.1337 17.3712 -4.55 0.3573 20.8562 -2.225 0.2052 16.8232
  [3,4,-1.133,0.1337,17.3712,-4.55,0.3573,20.8562,-2.225,0.2052,16.8232],
// 3 15 0.871 0.1174 15.2872 0.712 0.107 15.6292 0.304 0.0804 14.4402
  [3,15,0.871,0.1174,15.2872,0.712,0.107,15.6292,0.304,0.0804,14.4402],
// 4 4 0.712 0.107 15.6292 0.871 0.1174 15.2872 1.387 0.1511 16.1642 0.712 0.107 17.3632
  [4,4,0.712,0.107,15.6292,0.871,0.1174,15.2872,1.387,0.1511,16.1642,0.712,0.107,17.3632],
// 4 4 0.712 0.107 17.3632 1.387 0.1511 16.1642 2.363 0.2149 16.6572 0.712 0.1069 22.7542
  [4,4,0.712,0.107,17.3632,1.387,0.1511,16.1642,2.363,0.2149,16.6572,0.712,0.1069,22.7542],
// 4 4 0.712 0.1069 22.7542 2.363 0.2149 16.6572 3.339 0.2787 16.1642 0.712 0.1068 27.7352
  [4,4,0.712,0.1069,22.7542,2.363,0.2149,16.6572,3.339,0.2787,16.1642,0.712,0.1068,27.7352],
// 4 4 1.387 0.1513 4.1952 0.871 0.1176 5.0722 -0.0097 0.06 3.5352 -0.0024 0.06 -0.5544
  [4,4,1.387,0.1513,4.1952,0.871,0.1176,5.0722,-0.0097,0.06,3.5352,-0.0024,0.06,-0.5544],
// 3 15 0.413 0.0873 26.9812 -0.0039 0.06 26.5252 -0.0048 0.06 22.9142
  [3,15,0.413,0.0873,26.9812,-0.0039,0.06,26.5252,-0.0048,0.06,22.9142],
// 3 15 -0.0039 0.06 26.5252 -4.55 0.3573 21.4062 -0.0048 0.06 22.9142
  [3,15,-0.0039,0.06,26.5252,-4.55,0.3573,21.4062,-0.0048,0.06,22.9142],
// 3 15 -0.0048 0.06 22.9142 -2.739 0.2388 19.9502 -0.005 0.06 22.1752
  [3,15,-0.0048,0.06,22.9142,-2.739,0.2388,19.9502,-0.005,0.06,22.1752],
// 3 15 0.712 0.1069 22.7542 -0.0048 0.06 22.9142 -0.005 0.06 22.1752
  [3,15,0.712,0.1069,22.7542,-0.0048,0.06,22.9142,-0.005,0.06,22.1752],
// 4 4 0.712 0.107 17.3632 0.712 0.1069 22.7542 -0.005 0.06 22.1752 -0.0063 0.06 17.2112
  [4,4,0.712,0.107,17.3632,0.712,0.1069,22.7542,-0.005,0.06,22.1752,-0.0063,0.06,17.2112],
// 3 4 -0.005 0.06 22.1752 -2.739 0.2388 19.9502 -0.0063 0.06 17.2112
  [3,4,-0.005,0.06,22.1752,-2.739,0.2388,19.9502,-0.0063,0.06,17.2112],
// 4 15 0.871 0.1176 5.0722 0.304 0.0805 5.9192 -0.0092 0.06 5.3052 -0.0097 0.06 3.5352
  [4,15,0.871,0.1176,5.0722,0.304,0.0805,5.9192,-0.0092,0.06,5.3052,-0.0097,0.06,3.5352],
// 3 15 -0.0092 0.06 5.3052 -0.355 0.0827 4.6132 -0.0097 0.06 3.5352
  [3,15,-0.0092,0.06,5.3052,-0.355,0.0827,4.6132,-0.0097,0.06,3.5352],
// 3 15 -0.0063 0.06 17.2112 -0.355 0.0828 15.7462 -0.0068 0.06 15.1052
  [3,15,-0.0063,0.06,17.2112,-0.355,0.0828,15.7462,-0.0068,0.06,15.1052],
// 3 15 0.304 0.0804 14.4402 -0.0063 0.06 17.2112 -0.0068 0.06 15.1052
  [3,15,0.304,0.0804,14.4402,-0.0063,0.06,17.2112,-0.0068,0.06,15.1052],
// 4 15 -0.0074 0.06 12.7452 -0.271 0.0773 11.0842 -0.206 0.073 10.1792 -0.0086 0.06 7.6152
  [4,15,-0.0074,0.06,12.7452,-0.271,0.0773,11.0842,-0.206,0.073,10.1792,-0.0086,0.06,7.6152],
// 3 15 -0.0086 0.06 7.6152 -0.206 0.073 10.1792 -0.271 0.0772 9.2742
  [3,15,-0.0086,0.06,7.6152,-0.206,0.073,10.1792,-0.271,0.0772,9.2742],
// 3 15 -0.0086 0.06 7.6152 -0.271 0.0772 9.2742 -0.454 0.0892 8.5072
  [3,15,-0.0086,0.06,7.6152,-0.271,0.0772,9.2742,-0.454,0.0892,8.5072],
// 4 15 0.582 0.0986 10.1792 -0.0074 0.06 12.7452 -0.0086 0.06 7.6152 0.458 0.0905 8.8842
  [4,15,0.582,0.0986,10.1792,-0.0074,0.06,12.7452,-0.0086,0.06,7.6152,0.458,0.0905,8.8842],
// 3 15 0.582 0.0986 10.1792 0.458 0.0905 11.4742 -0.0074 0.06 12.7452
  [3,15,0.582,0.0986,10.1792,0.458,0.0905,11.4742,-0.0074,0.06,12.7452],
// 4 4 -0.355 0.0828 15.7462 -0.428 0.0876 13.3062 -0.0074 0.06 12.7452 -0.0068 0.06 15.1052
  [4,4,-0.355,0.0828,15.7462,-0.428,0.0876,13.3062,-0.0074,0.06,12.7452,-0.0068,0.06,15.1052],
// 3 4 0.304 0.0804 14.4402 -0.0068 0.06 15.1052 -0.0074 0.06 12.7452
  [3,4,0.304,0.0804,14.4402,-0.0068,0.06,15.1052,-0.0074,0.06,12.7452],
// 3 4 0.304 0.0805 5.9192 -0.0086 0.06 7.6152 -0.0092 0.06 5.3052
  [3,4,0.304,0.0805,5.9192,-0.0086,0.06,7.6152,-0.0092,0.06,5.3052],
// 4 4 -0.0092 0.06 5.3052 -0.0086 0.06 7.6152 -0.428 0.0875 7.0532 -0.355 0.0827 4.6132
  [4,4,-0.0092,0.06,5.3052,-0.0086,0.06,7.6152,-0.428,0.0875,7.0532,-0.355,0.0827,4.6132],
// 3 4 -0.0097 0.06 3.5352 -1.133 0.1335 2.9882 -0.0024 0.06 -0.5544
  [3,4,-0.0097,0.06,3.5352,-1.133,0.1335,2.9882,-0.0024,0.06,-0.5544],
// 4 4 -0.0024 0.06 -0.5544 -1.133 0.1335 2.9882 -2.225 0.205 3.5352 -5.6 0.4262 0.84
  [4,4,-0.0024,0.06,-0.5544,-1.133,0.1335,2.9882,-2.225,0.205,3.5352,-5.6,0.4262,0.84],
// 3 4 -5.6 0.4262 0.84 -2.225 0.205 3.5352 -3.151 0.2656 5.0942
  [3,4,-5.6,0.4262,0.84,-2.225,0.205,3.5352,-3.151,0.2656,5.0942],
// 3 4 -5.6 0.4262 0.84 -3.151 0.2656 5.0942 -3.77 0.3061 7.4272
  [3,4,-5.6,0.4262,0.84,-3.151,0.2656,5.0942,-3.77,0.3061,7.4272],
// 3 4 -5.6 0.4262 0.84 -3.77 0.3061 7.4272 -3.987 0.3203 10.1792
  [3,4,-5.6,0.4262,0.84,-3.77,0.3061,7.4272,-3.987,0.3203,10.1792],
// 4 4 -5.6 0.4262 0.84 -4.55 0.3573 20.8562 -4.55 0.3573 21.4062 -5.6 0.4212 87.95
  [4,4,-5.6,0.4262,0.84,-4.55,0.3573,20.8562,-4.55,0.3573,21.4062,-5.6,0.4212,87.95],
// 4 4 -5.6 0.4212 87.95 -4.55 0.3573 21.4062 -0.0039 0.06 26.5252 -0.0228 0.0601 81.7753
  [4,4,-5.6,0.4212,87.95,-4.55,0.3573,21.4062,-0.0039,0.06,26.5252,-0.0228,0.0601,81.7753],
// 4 4 -0.0039 0.06 26.5252 0.413 0.0873 26.9812 0.712 0.1068 27.7352 -0.0228 0.0601 81.7753
  [4,4,-0.0039,0.06,26.5252,0.413,0.0873,26.9812,0.712,0.1068,27.7352,-0.0228,0.0601,81.7753],
// 4 4 5.6 0.4255 75.55 -0.0228 0.0601 81.7753 0.712 0.1068 27.7352 3.339 0.2787 16.1642
  [4,4,5.6,0.4255,75.55,-0.0228,0.0601,81.7753,0.712,0.1068,27.7352,3.339,0.2787,16.1642],
// 3 4 5.6 0.4255 75.55 3.339 0.2787 16.1642 4.166 0.3328 14.7602
  [3,4,5.6,0.4255,75.55,3.339,0.2787,16.1642,4.166,0.3328,14.7602],
// 3 4 5.6 0.4255 75.55 4.166 0.3328 14.7602 4.719 0.3687 12.6582
  [3,4,5.6,0.4255,75.55,4.166,0.3328,14.7602,4.719,0.3687,12.6582],
// 3 4 5.6 0.4255 75.55 4.719 0.3687 12.6582 4.913 0.3813 10.1792
  [3,4,5.6,0.4255,75.55,4.719,0.3687,12.6582,4.913,0.3813,10.1792],
// 3 4 5.6 0.4255 75.55 4.913 0.3813 10.1792 5.6 0.4262 -1.95
  [3,4,5.6,0.4255,75.55,4.913,0.3813,10.1792,5.6,0.4262,-1.95],
// 3 4 5.6 0.4262 -1.95 4.913 0.3813 10.1792 4.719 0.3687 7.7002
  [3,4,5.6,0.4262,-1.95,4.913,0.3813,10.1792,4.719,0.3687,7.7002],
// 3 4 5.6 0.4262 -1.95 4.719 0.3687 7.7002 4.166 0.3328 5.5992
  [3,4,5.6,0.4262,-1.95,4.719,0.3687,7.7002,4.166,0.3328,5.5992],
// 3 4 5.6 0.4262 -1.95 4.166 0.3328 5.5992 3.339 0.2789 4.1952
  [3,4,5.6,0.4262,-1.95,4.166,0.3328,5.5992,3.339,0.2789,4.1952],
// 4 4 5.6 0.4262 -1.95 3.339 0.2789 4.1952 2.363 0.2151 3.7012 -0.0024 0.06 -0.5544
  [4,4,5.6,0.4262,-1.95,3.339,0.2789,4.1952,2.363,0.2151,3.7012,-0.0024,0.06,-0.5544],
// 3 4 -0.0024 0.06 -0.5544 2.363 0.2151 3.7012 1.387 0.1513 4.1952
  [3,4,-0.0024,0.06,-0.5544,2.363,0.2151,3.7012,1.387,0.1513,4.1952],
// 5 4 -0.0228 0.0601 81.7753 -0.0024 0.06 -0.5544 5.6 0.4262 -1.95 -5.6 0.4262 0.84
  [5,4,-0.0228,0.0601,81.7753,-0.0024,0.06,-0.5544,5.6,0.4262,-1.95,-5.6,0.4262,0.84],
// 5 4 -0.0228 0.3101 81.7753 -0.0023 0.31 -0.5544 5.6 0.6762 -1.95 -5.6 0.6762 0.84
  [5,4,-0.0228,0.3101,81.7753,-0.0023,0.31,-0.5544,5.6,0.6762,-1.95,-5.6,0.6762,0.84],
];
module ldraw_lib__4125165gc01(step=0, col=false, unit=2/5, alt=false, line=0.2, solid=!$preview)
    makepoly(ldraw_lib__4125165gc01(), step=step, col=col, unit=unit, alt=alt, line=line, solid=solid);
ldraw_lib__4125165gc01(line=0.2);
